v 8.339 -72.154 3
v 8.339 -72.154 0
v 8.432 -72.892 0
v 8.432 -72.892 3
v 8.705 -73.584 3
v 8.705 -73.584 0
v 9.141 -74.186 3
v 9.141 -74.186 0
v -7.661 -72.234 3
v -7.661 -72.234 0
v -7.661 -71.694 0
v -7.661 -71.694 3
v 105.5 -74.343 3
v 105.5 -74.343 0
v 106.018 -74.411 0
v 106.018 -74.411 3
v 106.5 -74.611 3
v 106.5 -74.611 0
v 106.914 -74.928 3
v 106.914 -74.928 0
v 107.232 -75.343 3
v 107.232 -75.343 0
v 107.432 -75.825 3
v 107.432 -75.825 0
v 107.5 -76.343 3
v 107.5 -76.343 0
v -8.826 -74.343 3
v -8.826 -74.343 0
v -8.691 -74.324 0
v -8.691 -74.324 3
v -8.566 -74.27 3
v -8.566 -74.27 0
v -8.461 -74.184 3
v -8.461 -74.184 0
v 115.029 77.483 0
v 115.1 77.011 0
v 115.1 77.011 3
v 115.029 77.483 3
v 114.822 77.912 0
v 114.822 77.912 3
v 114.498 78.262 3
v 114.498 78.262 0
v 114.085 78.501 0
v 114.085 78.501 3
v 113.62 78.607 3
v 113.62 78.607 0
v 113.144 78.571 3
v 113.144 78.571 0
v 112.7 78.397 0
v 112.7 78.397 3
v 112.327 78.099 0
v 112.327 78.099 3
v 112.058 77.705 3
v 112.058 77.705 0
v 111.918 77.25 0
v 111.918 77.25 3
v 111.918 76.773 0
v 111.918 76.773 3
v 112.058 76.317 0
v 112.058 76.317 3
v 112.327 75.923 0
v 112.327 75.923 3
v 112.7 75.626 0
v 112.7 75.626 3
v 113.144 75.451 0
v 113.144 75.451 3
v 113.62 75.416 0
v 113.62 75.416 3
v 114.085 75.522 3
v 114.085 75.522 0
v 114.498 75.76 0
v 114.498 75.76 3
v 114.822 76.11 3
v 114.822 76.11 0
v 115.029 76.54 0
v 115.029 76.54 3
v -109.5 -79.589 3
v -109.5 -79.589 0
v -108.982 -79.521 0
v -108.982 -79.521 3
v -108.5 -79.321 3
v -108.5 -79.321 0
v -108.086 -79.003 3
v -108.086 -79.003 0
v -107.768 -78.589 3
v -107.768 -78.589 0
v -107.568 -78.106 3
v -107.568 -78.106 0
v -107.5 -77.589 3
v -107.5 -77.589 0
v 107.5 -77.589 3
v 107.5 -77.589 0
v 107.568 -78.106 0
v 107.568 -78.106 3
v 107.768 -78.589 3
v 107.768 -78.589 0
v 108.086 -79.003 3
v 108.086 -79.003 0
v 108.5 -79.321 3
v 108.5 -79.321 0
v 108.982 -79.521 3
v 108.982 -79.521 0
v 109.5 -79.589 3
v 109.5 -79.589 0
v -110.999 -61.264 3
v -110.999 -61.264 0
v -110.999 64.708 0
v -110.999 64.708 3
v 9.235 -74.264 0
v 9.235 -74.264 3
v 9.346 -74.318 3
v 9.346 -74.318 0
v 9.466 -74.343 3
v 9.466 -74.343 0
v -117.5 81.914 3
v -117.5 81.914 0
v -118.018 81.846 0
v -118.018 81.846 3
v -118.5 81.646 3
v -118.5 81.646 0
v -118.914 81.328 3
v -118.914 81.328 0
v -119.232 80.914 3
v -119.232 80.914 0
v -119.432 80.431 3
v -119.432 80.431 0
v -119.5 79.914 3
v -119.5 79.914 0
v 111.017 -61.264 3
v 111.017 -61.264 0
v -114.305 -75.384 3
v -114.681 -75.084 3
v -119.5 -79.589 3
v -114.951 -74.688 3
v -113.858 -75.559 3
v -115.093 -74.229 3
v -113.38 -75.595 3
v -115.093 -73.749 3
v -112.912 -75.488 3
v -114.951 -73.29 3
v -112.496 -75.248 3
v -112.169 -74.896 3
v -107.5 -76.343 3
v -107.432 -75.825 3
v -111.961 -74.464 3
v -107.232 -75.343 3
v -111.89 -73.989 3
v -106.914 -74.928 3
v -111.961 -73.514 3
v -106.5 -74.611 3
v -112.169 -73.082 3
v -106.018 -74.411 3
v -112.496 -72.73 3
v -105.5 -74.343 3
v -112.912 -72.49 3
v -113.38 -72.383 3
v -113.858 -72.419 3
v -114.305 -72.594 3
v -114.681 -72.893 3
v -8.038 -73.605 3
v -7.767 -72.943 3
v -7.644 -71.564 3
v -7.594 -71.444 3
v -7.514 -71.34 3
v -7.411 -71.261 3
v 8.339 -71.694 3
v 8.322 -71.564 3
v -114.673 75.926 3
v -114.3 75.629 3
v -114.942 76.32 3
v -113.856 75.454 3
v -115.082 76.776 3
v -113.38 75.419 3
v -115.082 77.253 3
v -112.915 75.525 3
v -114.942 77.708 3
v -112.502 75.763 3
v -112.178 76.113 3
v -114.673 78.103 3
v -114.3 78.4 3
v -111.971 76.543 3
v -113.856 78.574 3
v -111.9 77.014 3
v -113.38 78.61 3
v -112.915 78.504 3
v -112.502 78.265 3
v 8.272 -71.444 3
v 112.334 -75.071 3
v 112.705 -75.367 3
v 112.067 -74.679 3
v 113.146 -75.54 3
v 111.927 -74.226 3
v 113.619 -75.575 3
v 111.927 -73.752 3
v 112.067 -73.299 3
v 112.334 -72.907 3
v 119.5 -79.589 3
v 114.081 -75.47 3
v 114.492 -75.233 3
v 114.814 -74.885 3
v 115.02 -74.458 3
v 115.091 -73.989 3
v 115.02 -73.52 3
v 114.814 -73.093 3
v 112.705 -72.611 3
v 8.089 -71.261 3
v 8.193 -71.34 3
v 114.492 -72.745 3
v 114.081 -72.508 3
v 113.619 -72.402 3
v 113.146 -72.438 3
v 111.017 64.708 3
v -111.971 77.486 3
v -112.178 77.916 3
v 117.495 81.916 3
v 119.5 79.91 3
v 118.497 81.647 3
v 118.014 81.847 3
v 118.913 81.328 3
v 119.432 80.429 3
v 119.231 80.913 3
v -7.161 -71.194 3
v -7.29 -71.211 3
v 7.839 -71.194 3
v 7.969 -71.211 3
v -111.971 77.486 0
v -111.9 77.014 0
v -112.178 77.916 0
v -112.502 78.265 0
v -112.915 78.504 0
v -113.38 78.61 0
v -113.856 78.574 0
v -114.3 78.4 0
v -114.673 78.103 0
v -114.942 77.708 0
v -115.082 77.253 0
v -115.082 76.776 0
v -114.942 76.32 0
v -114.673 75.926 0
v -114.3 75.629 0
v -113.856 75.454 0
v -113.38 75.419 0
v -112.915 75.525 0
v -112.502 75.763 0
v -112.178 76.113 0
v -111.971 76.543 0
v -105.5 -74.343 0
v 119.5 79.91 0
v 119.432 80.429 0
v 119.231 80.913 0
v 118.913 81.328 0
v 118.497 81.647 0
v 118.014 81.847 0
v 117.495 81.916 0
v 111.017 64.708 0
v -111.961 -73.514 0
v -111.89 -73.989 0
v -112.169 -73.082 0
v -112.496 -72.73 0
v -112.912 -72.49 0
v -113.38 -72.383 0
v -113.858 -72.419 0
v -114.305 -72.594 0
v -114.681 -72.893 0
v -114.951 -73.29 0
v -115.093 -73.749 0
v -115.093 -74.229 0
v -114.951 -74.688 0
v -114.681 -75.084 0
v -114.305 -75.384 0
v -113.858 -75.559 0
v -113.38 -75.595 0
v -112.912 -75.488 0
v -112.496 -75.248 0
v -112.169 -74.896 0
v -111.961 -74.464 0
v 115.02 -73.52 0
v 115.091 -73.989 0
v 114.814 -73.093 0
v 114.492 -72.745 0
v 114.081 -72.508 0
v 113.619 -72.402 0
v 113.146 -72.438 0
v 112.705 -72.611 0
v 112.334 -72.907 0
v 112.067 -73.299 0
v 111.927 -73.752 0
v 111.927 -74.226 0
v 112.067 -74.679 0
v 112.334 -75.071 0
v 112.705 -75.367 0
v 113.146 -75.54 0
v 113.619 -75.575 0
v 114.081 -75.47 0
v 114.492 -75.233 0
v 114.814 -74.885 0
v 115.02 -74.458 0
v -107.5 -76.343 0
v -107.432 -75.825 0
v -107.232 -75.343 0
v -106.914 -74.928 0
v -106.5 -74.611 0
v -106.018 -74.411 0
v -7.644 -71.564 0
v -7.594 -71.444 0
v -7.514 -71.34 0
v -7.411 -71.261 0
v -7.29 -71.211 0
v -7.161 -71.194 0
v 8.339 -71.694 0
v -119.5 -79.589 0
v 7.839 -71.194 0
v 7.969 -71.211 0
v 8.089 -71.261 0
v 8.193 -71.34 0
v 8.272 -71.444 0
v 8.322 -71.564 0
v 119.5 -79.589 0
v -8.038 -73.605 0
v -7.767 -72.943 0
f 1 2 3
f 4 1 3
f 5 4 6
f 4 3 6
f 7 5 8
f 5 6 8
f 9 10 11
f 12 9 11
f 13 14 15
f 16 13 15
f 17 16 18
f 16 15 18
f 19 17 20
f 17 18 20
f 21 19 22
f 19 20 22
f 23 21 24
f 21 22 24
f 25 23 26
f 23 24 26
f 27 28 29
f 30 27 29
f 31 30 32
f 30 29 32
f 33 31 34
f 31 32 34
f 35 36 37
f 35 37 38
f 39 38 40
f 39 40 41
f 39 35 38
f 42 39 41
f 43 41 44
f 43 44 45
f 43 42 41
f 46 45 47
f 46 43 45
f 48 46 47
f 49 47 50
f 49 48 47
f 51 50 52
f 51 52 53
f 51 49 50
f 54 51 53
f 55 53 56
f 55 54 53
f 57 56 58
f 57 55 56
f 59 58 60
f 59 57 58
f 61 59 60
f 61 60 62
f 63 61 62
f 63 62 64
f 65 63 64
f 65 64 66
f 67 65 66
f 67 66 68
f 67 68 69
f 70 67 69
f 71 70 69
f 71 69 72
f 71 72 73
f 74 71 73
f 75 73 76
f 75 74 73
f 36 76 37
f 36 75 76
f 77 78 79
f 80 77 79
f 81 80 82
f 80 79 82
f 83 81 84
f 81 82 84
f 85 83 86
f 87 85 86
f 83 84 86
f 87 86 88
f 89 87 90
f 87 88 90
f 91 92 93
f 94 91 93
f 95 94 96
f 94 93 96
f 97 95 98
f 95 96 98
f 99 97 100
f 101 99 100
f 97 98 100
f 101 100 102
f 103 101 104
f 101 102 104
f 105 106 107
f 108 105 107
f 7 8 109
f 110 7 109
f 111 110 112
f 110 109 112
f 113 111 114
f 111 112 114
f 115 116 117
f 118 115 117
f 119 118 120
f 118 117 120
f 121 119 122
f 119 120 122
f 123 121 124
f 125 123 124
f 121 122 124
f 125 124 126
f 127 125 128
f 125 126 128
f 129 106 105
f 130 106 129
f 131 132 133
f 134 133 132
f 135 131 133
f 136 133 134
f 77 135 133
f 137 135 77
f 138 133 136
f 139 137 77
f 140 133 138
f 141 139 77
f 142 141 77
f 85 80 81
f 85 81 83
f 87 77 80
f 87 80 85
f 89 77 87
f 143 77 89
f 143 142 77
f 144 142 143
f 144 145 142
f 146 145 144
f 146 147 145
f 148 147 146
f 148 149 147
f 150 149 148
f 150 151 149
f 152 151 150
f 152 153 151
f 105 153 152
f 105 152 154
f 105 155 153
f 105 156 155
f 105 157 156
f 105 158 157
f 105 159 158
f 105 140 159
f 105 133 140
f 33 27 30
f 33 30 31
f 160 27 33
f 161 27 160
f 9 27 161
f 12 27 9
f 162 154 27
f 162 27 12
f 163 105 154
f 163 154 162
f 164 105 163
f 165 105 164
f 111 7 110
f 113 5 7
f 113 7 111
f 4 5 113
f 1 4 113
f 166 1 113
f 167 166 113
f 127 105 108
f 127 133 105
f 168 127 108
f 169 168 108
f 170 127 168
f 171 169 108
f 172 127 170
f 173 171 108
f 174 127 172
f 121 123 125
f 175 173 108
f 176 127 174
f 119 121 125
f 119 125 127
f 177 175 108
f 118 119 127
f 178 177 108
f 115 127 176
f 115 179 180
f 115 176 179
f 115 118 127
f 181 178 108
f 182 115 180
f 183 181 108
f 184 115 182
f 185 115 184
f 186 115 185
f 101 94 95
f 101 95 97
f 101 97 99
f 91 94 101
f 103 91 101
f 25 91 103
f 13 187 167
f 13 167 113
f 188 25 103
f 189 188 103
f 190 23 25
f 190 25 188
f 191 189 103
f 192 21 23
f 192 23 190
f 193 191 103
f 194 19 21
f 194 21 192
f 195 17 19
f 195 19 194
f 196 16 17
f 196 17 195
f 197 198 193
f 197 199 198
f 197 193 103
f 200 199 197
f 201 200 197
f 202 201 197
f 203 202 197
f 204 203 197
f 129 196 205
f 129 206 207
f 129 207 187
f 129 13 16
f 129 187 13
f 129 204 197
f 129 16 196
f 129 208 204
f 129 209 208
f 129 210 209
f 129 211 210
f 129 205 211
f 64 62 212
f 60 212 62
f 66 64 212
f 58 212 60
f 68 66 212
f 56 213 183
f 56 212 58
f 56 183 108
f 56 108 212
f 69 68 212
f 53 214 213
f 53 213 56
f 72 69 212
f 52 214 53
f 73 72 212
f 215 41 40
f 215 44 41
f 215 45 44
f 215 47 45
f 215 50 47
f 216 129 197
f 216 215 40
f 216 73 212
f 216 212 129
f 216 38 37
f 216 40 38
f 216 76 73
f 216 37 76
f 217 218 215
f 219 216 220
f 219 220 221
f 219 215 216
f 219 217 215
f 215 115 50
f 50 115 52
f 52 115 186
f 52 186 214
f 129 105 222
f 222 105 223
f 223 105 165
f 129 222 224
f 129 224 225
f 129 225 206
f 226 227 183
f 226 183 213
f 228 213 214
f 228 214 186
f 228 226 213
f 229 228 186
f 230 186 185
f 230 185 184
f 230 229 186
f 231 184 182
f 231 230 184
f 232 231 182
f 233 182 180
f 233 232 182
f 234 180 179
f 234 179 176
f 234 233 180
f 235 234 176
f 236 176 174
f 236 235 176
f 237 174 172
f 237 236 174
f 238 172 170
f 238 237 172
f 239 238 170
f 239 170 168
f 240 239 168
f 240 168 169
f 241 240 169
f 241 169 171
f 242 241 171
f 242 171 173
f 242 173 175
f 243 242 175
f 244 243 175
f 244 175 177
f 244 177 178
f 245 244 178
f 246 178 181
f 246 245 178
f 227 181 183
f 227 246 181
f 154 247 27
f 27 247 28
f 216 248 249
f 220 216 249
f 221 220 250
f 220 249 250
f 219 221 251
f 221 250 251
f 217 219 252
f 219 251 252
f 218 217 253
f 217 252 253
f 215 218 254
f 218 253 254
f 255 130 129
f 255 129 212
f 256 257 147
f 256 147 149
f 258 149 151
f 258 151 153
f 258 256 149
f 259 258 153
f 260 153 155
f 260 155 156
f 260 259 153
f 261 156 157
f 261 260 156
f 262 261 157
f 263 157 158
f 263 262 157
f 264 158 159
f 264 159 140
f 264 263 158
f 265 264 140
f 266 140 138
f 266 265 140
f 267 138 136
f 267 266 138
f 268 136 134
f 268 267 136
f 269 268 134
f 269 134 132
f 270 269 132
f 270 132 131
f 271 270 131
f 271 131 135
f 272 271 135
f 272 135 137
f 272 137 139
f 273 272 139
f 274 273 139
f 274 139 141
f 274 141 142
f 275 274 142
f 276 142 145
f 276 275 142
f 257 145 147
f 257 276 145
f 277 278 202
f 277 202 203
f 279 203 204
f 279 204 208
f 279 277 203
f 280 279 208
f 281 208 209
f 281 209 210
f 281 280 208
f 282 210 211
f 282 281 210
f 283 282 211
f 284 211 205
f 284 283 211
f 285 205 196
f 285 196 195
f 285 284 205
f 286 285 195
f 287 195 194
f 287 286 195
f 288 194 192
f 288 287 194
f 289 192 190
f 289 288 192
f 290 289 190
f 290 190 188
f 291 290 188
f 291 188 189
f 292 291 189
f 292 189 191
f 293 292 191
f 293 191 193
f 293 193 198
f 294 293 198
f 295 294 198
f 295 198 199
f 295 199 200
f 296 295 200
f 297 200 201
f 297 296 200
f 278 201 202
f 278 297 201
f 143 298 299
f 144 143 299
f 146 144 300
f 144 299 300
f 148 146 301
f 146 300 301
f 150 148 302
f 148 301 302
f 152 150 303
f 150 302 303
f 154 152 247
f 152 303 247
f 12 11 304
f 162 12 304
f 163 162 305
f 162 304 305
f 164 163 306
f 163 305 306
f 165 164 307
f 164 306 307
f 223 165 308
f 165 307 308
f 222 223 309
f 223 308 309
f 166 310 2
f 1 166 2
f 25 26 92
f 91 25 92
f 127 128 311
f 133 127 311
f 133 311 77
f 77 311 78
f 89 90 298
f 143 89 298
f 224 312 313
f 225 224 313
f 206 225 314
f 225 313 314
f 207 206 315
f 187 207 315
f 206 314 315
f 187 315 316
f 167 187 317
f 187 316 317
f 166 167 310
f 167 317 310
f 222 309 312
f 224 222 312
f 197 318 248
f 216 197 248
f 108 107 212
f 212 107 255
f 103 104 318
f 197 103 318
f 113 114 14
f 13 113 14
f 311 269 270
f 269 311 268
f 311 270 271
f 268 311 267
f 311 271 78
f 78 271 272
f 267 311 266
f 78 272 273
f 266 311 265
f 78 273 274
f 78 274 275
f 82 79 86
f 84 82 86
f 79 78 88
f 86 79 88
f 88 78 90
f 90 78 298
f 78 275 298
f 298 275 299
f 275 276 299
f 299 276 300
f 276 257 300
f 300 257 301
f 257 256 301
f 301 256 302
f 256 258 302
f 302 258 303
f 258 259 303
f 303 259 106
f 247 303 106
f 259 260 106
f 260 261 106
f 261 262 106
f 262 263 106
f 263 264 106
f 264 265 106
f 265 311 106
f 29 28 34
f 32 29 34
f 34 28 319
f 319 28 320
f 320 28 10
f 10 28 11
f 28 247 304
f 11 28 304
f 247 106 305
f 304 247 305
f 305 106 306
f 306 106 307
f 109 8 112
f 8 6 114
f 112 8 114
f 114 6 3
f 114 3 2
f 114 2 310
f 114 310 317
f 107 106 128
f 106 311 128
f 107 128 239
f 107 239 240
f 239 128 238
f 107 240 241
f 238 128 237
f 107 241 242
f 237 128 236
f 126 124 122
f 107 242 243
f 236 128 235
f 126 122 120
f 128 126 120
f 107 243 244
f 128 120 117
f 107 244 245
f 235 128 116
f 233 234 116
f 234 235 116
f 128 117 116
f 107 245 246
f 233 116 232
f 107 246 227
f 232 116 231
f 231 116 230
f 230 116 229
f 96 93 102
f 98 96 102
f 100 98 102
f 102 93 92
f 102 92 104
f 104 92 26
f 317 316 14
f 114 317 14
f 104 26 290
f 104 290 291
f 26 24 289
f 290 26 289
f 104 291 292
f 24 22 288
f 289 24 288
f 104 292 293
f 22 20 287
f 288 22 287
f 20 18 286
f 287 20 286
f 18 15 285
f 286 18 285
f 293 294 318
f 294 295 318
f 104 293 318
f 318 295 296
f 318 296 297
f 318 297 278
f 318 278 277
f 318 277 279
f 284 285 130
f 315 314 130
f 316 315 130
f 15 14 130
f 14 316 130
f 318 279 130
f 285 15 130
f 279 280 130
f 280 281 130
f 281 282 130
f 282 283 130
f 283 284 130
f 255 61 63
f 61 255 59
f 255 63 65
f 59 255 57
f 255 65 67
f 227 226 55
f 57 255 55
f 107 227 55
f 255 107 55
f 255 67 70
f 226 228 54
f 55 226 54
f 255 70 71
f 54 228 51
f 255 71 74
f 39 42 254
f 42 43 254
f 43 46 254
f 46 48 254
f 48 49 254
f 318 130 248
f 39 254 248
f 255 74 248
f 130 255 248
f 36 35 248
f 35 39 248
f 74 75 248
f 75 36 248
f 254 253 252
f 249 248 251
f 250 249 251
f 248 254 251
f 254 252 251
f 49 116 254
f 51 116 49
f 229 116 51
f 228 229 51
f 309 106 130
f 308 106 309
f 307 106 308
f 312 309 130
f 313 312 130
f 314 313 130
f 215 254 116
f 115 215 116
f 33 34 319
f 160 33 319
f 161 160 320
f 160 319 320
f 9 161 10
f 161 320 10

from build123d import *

# Parameters (mm, degrees)
SKETCH1_R           = 1.610492359
SKETCH1_R_2         = 1.59089725
SKETCH1_R_3         = 1.6
SKETCH1_W           = 222.015696088
SKETCH1_H           = 125.972340976
BOSS_EXTRUDE1_DEPTH = 3


with BuildPart() as part:
    # Sketch1 → Boss-Extrude1 (new body)
    with BuildSketch(Plane.XY):
        with BuildLine():
            Line((-105.5, -74.342560363), (-8.826077226, -74.342560363))
            ThreePointArc((-8.826077226, -74.342560363), (-8.626849156, -74.301174008), (-8.460609358, -74.183832695))
            ThreePointArc((-8.460609358, -74.183832695), (-7.882511931, -73.28221691), (-7.661371157, -72.234264423))
            Line((-7.661371157, -72.234264423), (-7.660812811, -71.693665015))
            ThreePointArc((-7.660812811, -71.693665015), (-7.514183841, -71.340445506), (-7.160813078, -71.194181429))
            Line((-7.160813078, -71.194181429), (7.839186922, -71.194181429))
            ThreePointArc((7.839186922, -71.194181429), (8.192557686, -71.340445506), (8.339186655, -71.693665015))
            Line((8.339186655, -71.693665015), (8.338670775, -72.154345161))
            ThreePointArc((8.338670775, -72.154345161), (8.546458509, -73.246362553), (9.140780516, -74.185755485))
            ThreePointArc((9.140780516, -74.185755485), (9.288714604, -74.294526792), (9.465938947, -74.342560363))
            Line((9.465938947, -74.342560363), (105.5, -74.342560363))
            ThreePointArc((105.5, -74.342560363), (106.914213562, -74.928346801), (107.5, -76.342560363))
            Line((107.5, -76.342560363), (107.5, -77.588833763))
            ThreePointArc((107.5, -77.588833763), (108.085786438, -79.003047325), (109.5, -79.588833763))
            Line((109.5, -79.588833763), (119.500003053, -79.588833763))
            Line((119.500003053, -79.588833763), (119.500003053, -78.888833763))
            Line((119.500003053, -78.888833763), (119.500003053, 79.91034623))
            ThreePointArc((119.500003053, 79.91034623), (118.912699712, 81.328214854), (117.494826949, 81.9155082))
            Line((117.494826949, 81.9155082), (-117.5, 81.913851764))
            ThreePointArc((-117.5, 81.913851764), (-118.914213562, 81.328065327), (-119.5, 79.913851764))
            Line((-119.5, 79.913851764), (-119.5, 0))
            Line((-119.5, 0), (-119.5, -78.888833763))
            Line((-119.5, -78.888833763), (-119.5, -79.588833763))
            Line((-119.5, -79.588833763), (-109.5, -79.588833763))
            ThreePointArc((-109.5, -79.588833763), (-108.085786438, -79.003047325), (-107.5, -77.588833763))
            Line((-107.5, -77.588833763), (-107.5, -76.342560363))
            ThreePointArc((-107.5, -76.342560363), (-106.914213562, -74.928346801), (-105.5, -74.342560363))
        make_face()
        with Locations((-113.5, -73.988833763)):
            Circle(SKETCH1_R, mode=Mode.SUBTRACT)
        with Locations((113.5, -73.988833763)):
            Circle(SKETCH1_R_2, mode=Mode.SUBTRACT)
        with Locations((-113.5, 77.014278693)):
            Circle(SKETCH1_R_3, mode=Mode.SUBTRACT)
        with Locations((0.009179053, 1.722083042)):
            Rectangle(SKETCH1_W, SKETCH1_H, mode=Mode.SUBTRACT)
        with Locations((113.5, 77.011166237)):
            Circle(SKETCH1_R_3, mode=Mode.SUBTRACT)
    extrude(amount=BOSS_EXTRUDE1_DEPTH)


solid = part.part
